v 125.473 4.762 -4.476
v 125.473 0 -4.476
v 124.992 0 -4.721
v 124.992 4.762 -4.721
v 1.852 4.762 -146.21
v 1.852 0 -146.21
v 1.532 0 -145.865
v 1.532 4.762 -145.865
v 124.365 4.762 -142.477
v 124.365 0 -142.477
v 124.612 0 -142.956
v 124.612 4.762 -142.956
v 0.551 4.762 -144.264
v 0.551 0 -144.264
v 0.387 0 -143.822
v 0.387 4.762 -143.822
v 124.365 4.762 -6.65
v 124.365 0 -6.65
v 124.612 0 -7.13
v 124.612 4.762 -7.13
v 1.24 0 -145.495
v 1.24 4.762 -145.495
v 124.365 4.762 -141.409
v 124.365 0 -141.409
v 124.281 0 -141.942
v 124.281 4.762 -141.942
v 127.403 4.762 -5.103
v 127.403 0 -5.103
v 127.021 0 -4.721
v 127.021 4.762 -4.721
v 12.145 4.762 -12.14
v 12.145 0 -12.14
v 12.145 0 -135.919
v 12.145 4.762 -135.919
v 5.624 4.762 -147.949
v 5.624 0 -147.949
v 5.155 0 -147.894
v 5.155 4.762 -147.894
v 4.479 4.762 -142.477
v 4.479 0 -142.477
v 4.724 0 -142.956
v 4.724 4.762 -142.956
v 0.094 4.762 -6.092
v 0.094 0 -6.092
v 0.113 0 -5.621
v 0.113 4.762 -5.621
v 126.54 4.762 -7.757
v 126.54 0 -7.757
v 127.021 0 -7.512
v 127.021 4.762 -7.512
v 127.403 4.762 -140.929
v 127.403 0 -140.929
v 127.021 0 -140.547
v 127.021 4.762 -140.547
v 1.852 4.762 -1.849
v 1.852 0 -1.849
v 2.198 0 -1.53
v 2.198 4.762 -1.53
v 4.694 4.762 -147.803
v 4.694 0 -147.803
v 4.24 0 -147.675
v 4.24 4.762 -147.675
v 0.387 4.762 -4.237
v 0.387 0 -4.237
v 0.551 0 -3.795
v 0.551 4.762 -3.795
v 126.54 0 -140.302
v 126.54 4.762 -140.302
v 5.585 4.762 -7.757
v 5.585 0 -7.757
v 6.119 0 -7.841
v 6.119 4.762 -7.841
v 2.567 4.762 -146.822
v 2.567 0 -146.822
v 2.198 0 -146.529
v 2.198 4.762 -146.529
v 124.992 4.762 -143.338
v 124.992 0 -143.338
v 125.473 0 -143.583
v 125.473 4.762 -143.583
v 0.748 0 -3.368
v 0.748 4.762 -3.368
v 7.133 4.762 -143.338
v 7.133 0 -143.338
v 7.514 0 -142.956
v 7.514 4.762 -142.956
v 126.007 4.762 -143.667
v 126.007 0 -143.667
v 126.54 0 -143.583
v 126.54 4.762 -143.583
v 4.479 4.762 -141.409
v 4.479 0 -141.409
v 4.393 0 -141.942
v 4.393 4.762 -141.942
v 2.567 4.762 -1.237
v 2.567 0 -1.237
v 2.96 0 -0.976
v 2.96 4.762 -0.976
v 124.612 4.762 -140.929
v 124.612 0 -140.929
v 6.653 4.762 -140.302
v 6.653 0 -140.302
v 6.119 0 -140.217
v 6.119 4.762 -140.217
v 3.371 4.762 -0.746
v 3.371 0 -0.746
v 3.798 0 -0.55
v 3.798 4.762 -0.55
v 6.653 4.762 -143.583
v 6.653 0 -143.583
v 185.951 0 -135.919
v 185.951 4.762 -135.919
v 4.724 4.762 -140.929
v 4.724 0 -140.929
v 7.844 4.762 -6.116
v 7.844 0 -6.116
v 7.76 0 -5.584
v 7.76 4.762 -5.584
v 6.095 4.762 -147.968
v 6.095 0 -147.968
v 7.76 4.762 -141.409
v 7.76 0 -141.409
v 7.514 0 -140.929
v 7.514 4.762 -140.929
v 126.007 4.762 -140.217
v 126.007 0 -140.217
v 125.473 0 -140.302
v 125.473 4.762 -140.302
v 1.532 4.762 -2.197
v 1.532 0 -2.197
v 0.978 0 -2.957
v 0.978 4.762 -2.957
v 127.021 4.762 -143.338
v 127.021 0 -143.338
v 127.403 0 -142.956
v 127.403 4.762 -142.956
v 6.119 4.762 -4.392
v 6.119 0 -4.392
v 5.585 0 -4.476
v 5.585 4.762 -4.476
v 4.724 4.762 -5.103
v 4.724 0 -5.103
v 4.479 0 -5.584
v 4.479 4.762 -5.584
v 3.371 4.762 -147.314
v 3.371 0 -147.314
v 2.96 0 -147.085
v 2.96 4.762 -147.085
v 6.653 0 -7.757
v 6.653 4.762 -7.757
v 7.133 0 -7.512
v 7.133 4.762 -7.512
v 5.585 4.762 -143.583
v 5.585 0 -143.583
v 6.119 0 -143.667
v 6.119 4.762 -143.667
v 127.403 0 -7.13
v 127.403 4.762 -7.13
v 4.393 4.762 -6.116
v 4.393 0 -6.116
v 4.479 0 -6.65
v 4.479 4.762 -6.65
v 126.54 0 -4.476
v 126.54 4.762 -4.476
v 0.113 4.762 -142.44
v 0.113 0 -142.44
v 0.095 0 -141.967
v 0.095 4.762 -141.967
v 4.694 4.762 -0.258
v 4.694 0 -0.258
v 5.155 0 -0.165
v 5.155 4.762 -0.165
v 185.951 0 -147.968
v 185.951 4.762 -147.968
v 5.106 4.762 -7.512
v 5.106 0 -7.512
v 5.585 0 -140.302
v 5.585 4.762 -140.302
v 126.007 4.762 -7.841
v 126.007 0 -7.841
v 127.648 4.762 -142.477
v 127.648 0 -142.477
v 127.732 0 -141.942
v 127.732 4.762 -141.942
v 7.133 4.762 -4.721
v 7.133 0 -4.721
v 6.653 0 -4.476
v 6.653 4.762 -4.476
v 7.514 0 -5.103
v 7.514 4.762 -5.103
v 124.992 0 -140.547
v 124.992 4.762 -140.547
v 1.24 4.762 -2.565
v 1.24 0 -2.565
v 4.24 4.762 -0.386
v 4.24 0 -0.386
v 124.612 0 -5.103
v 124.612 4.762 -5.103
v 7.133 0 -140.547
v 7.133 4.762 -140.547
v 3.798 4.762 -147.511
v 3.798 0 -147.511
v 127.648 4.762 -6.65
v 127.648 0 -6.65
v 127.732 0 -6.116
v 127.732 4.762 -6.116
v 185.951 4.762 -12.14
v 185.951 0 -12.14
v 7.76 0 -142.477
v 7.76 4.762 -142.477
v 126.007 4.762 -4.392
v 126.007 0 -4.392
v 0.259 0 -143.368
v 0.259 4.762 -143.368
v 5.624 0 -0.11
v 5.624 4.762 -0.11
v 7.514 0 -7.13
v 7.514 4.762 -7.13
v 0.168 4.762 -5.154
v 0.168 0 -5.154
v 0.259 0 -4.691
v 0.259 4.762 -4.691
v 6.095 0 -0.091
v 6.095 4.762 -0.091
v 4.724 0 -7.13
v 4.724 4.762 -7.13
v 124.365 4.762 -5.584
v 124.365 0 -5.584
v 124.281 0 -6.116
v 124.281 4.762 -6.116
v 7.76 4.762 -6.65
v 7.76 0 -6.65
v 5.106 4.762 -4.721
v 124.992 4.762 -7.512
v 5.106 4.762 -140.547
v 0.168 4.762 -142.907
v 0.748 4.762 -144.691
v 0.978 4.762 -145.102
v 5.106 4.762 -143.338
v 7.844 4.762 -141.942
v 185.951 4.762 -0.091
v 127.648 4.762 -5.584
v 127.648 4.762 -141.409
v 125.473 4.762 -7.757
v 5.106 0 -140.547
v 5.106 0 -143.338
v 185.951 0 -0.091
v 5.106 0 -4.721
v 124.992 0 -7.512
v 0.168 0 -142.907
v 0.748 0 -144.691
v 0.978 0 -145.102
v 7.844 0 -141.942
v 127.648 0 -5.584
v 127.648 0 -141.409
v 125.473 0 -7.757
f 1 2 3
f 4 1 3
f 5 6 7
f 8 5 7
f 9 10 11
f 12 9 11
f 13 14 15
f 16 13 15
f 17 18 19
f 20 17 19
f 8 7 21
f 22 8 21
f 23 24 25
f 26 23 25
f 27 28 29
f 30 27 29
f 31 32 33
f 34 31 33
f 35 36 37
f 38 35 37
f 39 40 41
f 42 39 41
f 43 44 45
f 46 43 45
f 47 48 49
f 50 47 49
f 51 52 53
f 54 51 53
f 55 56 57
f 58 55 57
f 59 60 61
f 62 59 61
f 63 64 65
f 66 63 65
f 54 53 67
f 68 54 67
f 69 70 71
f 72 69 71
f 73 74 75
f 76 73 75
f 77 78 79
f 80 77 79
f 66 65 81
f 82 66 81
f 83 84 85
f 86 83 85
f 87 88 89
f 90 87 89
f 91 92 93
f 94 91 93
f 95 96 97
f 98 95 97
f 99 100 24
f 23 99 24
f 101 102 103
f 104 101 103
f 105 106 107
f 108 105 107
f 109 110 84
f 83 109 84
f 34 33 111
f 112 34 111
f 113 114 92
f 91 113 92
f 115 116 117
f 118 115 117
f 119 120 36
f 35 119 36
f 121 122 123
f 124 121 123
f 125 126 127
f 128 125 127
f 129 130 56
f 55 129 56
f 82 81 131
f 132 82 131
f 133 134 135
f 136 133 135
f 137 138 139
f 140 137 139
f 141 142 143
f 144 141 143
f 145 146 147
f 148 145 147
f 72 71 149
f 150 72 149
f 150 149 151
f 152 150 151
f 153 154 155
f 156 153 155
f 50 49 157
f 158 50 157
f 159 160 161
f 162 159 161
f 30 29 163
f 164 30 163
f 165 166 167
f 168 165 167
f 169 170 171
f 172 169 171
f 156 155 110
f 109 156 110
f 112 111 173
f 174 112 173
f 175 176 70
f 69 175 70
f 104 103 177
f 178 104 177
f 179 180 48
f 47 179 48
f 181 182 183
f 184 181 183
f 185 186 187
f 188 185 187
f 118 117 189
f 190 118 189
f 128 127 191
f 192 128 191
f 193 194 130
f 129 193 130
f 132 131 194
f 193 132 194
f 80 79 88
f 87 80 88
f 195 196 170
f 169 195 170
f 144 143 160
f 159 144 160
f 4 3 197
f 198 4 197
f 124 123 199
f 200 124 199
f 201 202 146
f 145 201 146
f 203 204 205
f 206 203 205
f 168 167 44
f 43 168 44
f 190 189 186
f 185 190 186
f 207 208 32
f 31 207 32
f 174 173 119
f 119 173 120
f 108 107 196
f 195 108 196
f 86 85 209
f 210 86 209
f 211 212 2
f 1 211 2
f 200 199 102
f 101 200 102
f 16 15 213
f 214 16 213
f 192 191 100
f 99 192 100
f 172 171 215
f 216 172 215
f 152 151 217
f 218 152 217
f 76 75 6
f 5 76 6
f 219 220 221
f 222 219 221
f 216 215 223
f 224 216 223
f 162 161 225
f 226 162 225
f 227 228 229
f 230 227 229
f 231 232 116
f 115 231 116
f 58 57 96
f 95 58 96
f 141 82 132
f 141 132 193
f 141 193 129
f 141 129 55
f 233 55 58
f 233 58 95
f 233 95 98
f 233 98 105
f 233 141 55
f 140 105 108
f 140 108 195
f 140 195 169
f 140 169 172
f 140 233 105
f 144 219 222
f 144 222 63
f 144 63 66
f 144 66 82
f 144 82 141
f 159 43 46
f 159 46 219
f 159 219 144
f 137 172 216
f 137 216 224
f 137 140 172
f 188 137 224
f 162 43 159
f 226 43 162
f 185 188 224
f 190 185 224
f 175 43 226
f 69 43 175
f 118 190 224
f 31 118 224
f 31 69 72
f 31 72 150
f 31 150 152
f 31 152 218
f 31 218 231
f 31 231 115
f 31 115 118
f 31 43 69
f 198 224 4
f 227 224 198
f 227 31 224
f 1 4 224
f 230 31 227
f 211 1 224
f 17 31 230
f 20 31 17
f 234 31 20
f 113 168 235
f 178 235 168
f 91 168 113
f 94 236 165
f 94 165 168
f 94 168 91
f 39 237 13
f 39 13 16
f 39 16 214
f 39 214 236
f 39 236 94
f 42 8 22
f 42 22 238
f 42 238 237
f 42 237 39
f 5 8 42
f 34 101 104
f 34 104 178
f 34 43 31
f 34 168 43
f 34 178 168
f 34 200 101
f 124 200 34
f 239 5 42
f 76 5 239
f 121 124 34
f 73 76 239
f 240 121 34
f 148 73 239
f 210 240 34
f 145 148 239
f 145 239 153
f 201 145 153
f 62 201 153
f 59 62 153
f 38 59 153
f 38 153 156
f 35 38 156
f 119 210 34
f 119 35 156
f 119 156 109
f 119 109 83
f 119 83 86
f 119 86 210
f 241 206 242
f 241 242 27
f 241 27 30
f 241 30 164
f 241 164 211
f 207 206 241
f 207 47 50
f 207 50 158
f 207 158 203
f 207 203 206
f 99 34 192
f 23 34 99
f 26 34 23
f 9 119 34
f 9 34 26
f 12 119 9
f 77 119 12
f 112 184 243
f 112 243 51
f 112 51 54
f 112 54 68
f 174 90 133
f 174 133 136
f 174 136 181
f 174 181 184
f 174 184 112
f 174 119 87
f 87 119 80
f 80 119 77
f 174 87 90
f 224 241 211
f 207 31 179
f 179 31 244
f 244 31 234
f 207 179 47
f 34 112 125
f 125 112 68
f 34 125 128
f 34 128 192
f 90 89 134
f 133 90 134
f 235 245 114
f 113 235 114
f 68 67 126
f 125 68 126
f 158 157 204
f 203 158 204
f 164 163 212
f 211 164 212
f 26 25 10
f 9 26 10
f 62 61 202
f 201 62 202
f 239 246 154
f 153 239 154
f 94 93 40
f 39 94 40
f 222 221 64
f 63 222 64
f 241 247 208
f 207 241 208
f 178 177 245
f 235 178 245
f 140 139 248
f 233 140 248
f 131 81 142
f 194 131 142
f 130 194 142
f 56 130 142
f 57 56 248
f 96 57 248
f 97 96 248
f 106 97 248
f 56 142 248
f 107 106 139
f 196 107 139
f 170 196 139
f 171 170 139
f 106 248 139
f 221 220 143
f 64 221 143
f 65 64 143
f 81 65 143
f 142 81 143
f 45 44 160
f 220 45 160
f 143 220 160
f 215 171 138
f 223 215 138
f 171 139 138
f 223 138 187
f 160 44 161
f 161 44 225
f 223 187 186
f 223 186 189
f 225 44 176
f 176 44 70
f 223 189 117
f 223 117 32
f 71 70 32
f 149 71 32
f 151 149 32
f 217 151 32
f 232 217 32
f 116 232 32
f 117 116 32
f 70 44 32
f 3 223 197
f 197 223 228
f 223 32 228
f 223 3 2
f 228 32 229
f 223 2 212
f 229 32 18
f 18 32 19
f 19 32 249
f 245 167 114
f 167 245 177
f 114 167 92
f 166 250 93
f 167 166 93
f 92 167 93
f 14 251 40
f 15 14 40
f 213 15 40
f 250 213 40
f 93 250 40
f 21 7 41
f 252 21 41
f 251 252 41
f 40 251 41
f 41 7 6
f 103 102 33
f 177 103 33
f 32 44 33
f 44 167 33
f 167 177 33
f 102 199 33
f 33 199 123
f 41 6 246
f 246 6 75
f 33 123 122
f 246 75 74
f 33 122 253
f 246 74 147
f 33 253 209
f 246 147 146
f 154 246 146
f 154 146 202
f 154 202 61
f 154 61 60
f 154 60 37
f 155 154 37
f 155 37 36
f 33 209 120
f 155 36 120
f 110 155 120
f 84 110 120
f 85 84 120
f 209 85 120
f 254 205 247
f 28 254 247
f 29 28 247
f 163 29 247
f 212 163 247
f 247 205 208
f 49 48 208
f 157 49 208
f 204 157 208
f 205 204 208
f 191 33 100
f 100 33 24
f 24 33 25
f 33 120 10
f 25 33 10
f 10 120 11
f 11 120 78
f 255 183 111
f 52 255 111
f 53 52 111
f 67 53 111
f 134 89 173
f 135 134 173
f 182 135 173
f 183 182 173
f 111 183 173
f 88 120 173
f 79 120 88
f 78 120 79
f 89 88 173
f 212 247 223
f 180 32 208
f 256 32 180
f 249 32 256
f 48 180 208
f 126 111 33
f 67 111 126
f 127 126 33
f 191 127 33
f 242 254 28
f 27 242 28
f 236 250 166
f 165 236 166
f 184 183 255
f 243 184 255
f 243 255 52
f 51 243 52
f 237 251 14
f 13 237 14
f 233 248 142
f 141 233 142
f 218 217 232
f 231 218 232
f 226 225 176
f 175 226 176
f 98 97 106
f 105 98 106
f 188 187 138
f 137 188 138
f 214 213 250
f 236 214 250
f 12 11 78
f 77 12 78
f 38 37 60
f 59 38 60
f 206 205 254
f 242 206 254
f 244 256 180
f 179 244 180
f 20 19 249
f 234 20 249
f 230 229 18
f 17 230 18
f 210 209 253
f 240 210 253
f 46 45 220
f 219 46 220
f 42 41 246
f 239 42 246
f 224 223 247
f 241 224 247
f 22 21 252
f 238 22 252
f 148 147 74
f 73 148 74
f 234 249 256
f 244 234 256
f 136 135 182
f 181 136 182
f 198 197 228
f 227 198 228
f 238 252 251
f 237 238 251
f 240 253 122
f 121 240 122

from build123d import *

# Parameters (mm, degrees)
BOSS_EXTRUDE2_DEPTH = 4.7625


with BuildPart() as part:
    # Sketch1 → Boss-Extrude2 (new body)
    with BuildSketch(Plane(origin=(0, 0, 0), x_dir=(1, 0, 0), z_dir=(0, 1, 0))):
        Polygon((185.950525, 135.919), (185.950525, 147.9675), (6.09505, 147.968), (5.62377, 147.949), (5.15525, 147.894), (4.6936, 147.803), (4.24021, 147.675), (3.79786, 147.511), (3.37068, 147.314), (2.96003, 147.085), (2.56728, 146.822), (2.19797, 146.529), (1.85208, 146.21), (1.53238, 145.865), (1.24024, 145.495), (0.978408, 145.102), (0.748273, 144.691), (0.551215, 144.264), (0.38723, 143.822), (0.259071, 143.368), (0.168121, 142.907), (0.112999, 142.44), (0.0950846, 141.967), (0.0937066, 6.0923), (0.112999, 5.62102), (0.168121, 5.15387), (0.259071, 4.69085), (0.38723, 4.23746), (0.551215, 3.79511), (0.748273, 3.36793), (0.978408, 2.95727), (1.24024, 2.56453), (1.53238, 2.19659), (1.85208, 1.84933), (2.19797, 1.52962), (2.56728, 1.23748), (2.96003, 0.975653), (3.37068, 0.745518), (3.79786, 0.549836), (4.24021, 0.385851), (4.6936, 0.257693), (5.15525, 0.165365), (5.62377, 0.110243), (6.09505, 0.0909507), (185.950525, 0.0909507), (185.950525, 12.1405), (12.1447, 12.1405), (12.1447, 135.919), align=None)
        Polygon((5.10565, 7.5117), (5.58518, 7.75698), (6.11851, 7.84105), (6.65318, 7.75698), (7.13274, 7.5117), (7.51445, 7.12996), (7.75974, 6.65043), (7.8438, 6.11572), (7.75974, 5.5838), (7.51445, 5.10286), (7.13274, 4.72115), (6.65318, 4.47587), (6.11851, 4.3918), (5.58518, 4.47587), (5.10565, 4.72115), (4.72391, 5.10286), (4.47862, 5.5838), (4.39318, 6.11572), (4.47862, 6.65043), (4.72391, 7.12996), align=None, mode=Mode.SUBTRACT)
        Polygon((124.992, 7.5117), (125.473, 7.75698), (126.007, 7.84105), (126.54, 7.75698), (127.021, 7.5117), (127.403, 7.12996), (127.648, 6.65043), (127.732, 6.11572), (127.648, 5.5838), (127.403, 5.10286), (127.021, 4.72115), (126.54, 4.47587), (126.007, 4.3918), (125.473, 4.47587), (124.992, 4.72115), (124.612, 5.10286), (124.365, 5.5838), (124.281, 6.11572), (124.365, 6.65043), (124.612, 7.12996), align=None, mode=Mode.SUBTRACT)
        Polygon((5.10565, 143.338), (5.58518, 143.583), (6.11851, 143.667), (6.65318, 143.583), (7.13274, 143.338), (7.51445, 142.956), (7.75974, 142.477), (7.8438, 141.942), (7.75974, 141.409), (7.51445, 140.929), (7.13274, 140.547), (6.65318, 140.302), (6.11851, 140.217), (5.58518, 140.302), (5.10565, 140.547), (4.72391, 140.929), (4.47862, 141.409), (4.39318, 141.942), (4.47862, 142.477), (4.72391, 142.956), align=None, mode=Mode.SUBTRACT)
        Polygon((124.992, 143.338), (125.473, 143.583), (126.007, 143.667), (126.54, 143.583), (127.021, 143.338), (127.403, 142.956), (127.648, 142.477), (127.732, 141.942), (127.648, 141.409), (127.403, 140.929), (127.021, 140.547), (126.54, 140.302), (126.007, 140.217), (125.473, 140.302), (124.992, 140.547), (124.612, 140.929), (124.365, 141.409), (124.281, 141.942), (124.365, 142.477), (124.612, 142.956), align=None, mode=Mode.SUBTRACT)
    extrude(amount=BOSS_EXTRUDE2_DEPTH)


solid = part.part
